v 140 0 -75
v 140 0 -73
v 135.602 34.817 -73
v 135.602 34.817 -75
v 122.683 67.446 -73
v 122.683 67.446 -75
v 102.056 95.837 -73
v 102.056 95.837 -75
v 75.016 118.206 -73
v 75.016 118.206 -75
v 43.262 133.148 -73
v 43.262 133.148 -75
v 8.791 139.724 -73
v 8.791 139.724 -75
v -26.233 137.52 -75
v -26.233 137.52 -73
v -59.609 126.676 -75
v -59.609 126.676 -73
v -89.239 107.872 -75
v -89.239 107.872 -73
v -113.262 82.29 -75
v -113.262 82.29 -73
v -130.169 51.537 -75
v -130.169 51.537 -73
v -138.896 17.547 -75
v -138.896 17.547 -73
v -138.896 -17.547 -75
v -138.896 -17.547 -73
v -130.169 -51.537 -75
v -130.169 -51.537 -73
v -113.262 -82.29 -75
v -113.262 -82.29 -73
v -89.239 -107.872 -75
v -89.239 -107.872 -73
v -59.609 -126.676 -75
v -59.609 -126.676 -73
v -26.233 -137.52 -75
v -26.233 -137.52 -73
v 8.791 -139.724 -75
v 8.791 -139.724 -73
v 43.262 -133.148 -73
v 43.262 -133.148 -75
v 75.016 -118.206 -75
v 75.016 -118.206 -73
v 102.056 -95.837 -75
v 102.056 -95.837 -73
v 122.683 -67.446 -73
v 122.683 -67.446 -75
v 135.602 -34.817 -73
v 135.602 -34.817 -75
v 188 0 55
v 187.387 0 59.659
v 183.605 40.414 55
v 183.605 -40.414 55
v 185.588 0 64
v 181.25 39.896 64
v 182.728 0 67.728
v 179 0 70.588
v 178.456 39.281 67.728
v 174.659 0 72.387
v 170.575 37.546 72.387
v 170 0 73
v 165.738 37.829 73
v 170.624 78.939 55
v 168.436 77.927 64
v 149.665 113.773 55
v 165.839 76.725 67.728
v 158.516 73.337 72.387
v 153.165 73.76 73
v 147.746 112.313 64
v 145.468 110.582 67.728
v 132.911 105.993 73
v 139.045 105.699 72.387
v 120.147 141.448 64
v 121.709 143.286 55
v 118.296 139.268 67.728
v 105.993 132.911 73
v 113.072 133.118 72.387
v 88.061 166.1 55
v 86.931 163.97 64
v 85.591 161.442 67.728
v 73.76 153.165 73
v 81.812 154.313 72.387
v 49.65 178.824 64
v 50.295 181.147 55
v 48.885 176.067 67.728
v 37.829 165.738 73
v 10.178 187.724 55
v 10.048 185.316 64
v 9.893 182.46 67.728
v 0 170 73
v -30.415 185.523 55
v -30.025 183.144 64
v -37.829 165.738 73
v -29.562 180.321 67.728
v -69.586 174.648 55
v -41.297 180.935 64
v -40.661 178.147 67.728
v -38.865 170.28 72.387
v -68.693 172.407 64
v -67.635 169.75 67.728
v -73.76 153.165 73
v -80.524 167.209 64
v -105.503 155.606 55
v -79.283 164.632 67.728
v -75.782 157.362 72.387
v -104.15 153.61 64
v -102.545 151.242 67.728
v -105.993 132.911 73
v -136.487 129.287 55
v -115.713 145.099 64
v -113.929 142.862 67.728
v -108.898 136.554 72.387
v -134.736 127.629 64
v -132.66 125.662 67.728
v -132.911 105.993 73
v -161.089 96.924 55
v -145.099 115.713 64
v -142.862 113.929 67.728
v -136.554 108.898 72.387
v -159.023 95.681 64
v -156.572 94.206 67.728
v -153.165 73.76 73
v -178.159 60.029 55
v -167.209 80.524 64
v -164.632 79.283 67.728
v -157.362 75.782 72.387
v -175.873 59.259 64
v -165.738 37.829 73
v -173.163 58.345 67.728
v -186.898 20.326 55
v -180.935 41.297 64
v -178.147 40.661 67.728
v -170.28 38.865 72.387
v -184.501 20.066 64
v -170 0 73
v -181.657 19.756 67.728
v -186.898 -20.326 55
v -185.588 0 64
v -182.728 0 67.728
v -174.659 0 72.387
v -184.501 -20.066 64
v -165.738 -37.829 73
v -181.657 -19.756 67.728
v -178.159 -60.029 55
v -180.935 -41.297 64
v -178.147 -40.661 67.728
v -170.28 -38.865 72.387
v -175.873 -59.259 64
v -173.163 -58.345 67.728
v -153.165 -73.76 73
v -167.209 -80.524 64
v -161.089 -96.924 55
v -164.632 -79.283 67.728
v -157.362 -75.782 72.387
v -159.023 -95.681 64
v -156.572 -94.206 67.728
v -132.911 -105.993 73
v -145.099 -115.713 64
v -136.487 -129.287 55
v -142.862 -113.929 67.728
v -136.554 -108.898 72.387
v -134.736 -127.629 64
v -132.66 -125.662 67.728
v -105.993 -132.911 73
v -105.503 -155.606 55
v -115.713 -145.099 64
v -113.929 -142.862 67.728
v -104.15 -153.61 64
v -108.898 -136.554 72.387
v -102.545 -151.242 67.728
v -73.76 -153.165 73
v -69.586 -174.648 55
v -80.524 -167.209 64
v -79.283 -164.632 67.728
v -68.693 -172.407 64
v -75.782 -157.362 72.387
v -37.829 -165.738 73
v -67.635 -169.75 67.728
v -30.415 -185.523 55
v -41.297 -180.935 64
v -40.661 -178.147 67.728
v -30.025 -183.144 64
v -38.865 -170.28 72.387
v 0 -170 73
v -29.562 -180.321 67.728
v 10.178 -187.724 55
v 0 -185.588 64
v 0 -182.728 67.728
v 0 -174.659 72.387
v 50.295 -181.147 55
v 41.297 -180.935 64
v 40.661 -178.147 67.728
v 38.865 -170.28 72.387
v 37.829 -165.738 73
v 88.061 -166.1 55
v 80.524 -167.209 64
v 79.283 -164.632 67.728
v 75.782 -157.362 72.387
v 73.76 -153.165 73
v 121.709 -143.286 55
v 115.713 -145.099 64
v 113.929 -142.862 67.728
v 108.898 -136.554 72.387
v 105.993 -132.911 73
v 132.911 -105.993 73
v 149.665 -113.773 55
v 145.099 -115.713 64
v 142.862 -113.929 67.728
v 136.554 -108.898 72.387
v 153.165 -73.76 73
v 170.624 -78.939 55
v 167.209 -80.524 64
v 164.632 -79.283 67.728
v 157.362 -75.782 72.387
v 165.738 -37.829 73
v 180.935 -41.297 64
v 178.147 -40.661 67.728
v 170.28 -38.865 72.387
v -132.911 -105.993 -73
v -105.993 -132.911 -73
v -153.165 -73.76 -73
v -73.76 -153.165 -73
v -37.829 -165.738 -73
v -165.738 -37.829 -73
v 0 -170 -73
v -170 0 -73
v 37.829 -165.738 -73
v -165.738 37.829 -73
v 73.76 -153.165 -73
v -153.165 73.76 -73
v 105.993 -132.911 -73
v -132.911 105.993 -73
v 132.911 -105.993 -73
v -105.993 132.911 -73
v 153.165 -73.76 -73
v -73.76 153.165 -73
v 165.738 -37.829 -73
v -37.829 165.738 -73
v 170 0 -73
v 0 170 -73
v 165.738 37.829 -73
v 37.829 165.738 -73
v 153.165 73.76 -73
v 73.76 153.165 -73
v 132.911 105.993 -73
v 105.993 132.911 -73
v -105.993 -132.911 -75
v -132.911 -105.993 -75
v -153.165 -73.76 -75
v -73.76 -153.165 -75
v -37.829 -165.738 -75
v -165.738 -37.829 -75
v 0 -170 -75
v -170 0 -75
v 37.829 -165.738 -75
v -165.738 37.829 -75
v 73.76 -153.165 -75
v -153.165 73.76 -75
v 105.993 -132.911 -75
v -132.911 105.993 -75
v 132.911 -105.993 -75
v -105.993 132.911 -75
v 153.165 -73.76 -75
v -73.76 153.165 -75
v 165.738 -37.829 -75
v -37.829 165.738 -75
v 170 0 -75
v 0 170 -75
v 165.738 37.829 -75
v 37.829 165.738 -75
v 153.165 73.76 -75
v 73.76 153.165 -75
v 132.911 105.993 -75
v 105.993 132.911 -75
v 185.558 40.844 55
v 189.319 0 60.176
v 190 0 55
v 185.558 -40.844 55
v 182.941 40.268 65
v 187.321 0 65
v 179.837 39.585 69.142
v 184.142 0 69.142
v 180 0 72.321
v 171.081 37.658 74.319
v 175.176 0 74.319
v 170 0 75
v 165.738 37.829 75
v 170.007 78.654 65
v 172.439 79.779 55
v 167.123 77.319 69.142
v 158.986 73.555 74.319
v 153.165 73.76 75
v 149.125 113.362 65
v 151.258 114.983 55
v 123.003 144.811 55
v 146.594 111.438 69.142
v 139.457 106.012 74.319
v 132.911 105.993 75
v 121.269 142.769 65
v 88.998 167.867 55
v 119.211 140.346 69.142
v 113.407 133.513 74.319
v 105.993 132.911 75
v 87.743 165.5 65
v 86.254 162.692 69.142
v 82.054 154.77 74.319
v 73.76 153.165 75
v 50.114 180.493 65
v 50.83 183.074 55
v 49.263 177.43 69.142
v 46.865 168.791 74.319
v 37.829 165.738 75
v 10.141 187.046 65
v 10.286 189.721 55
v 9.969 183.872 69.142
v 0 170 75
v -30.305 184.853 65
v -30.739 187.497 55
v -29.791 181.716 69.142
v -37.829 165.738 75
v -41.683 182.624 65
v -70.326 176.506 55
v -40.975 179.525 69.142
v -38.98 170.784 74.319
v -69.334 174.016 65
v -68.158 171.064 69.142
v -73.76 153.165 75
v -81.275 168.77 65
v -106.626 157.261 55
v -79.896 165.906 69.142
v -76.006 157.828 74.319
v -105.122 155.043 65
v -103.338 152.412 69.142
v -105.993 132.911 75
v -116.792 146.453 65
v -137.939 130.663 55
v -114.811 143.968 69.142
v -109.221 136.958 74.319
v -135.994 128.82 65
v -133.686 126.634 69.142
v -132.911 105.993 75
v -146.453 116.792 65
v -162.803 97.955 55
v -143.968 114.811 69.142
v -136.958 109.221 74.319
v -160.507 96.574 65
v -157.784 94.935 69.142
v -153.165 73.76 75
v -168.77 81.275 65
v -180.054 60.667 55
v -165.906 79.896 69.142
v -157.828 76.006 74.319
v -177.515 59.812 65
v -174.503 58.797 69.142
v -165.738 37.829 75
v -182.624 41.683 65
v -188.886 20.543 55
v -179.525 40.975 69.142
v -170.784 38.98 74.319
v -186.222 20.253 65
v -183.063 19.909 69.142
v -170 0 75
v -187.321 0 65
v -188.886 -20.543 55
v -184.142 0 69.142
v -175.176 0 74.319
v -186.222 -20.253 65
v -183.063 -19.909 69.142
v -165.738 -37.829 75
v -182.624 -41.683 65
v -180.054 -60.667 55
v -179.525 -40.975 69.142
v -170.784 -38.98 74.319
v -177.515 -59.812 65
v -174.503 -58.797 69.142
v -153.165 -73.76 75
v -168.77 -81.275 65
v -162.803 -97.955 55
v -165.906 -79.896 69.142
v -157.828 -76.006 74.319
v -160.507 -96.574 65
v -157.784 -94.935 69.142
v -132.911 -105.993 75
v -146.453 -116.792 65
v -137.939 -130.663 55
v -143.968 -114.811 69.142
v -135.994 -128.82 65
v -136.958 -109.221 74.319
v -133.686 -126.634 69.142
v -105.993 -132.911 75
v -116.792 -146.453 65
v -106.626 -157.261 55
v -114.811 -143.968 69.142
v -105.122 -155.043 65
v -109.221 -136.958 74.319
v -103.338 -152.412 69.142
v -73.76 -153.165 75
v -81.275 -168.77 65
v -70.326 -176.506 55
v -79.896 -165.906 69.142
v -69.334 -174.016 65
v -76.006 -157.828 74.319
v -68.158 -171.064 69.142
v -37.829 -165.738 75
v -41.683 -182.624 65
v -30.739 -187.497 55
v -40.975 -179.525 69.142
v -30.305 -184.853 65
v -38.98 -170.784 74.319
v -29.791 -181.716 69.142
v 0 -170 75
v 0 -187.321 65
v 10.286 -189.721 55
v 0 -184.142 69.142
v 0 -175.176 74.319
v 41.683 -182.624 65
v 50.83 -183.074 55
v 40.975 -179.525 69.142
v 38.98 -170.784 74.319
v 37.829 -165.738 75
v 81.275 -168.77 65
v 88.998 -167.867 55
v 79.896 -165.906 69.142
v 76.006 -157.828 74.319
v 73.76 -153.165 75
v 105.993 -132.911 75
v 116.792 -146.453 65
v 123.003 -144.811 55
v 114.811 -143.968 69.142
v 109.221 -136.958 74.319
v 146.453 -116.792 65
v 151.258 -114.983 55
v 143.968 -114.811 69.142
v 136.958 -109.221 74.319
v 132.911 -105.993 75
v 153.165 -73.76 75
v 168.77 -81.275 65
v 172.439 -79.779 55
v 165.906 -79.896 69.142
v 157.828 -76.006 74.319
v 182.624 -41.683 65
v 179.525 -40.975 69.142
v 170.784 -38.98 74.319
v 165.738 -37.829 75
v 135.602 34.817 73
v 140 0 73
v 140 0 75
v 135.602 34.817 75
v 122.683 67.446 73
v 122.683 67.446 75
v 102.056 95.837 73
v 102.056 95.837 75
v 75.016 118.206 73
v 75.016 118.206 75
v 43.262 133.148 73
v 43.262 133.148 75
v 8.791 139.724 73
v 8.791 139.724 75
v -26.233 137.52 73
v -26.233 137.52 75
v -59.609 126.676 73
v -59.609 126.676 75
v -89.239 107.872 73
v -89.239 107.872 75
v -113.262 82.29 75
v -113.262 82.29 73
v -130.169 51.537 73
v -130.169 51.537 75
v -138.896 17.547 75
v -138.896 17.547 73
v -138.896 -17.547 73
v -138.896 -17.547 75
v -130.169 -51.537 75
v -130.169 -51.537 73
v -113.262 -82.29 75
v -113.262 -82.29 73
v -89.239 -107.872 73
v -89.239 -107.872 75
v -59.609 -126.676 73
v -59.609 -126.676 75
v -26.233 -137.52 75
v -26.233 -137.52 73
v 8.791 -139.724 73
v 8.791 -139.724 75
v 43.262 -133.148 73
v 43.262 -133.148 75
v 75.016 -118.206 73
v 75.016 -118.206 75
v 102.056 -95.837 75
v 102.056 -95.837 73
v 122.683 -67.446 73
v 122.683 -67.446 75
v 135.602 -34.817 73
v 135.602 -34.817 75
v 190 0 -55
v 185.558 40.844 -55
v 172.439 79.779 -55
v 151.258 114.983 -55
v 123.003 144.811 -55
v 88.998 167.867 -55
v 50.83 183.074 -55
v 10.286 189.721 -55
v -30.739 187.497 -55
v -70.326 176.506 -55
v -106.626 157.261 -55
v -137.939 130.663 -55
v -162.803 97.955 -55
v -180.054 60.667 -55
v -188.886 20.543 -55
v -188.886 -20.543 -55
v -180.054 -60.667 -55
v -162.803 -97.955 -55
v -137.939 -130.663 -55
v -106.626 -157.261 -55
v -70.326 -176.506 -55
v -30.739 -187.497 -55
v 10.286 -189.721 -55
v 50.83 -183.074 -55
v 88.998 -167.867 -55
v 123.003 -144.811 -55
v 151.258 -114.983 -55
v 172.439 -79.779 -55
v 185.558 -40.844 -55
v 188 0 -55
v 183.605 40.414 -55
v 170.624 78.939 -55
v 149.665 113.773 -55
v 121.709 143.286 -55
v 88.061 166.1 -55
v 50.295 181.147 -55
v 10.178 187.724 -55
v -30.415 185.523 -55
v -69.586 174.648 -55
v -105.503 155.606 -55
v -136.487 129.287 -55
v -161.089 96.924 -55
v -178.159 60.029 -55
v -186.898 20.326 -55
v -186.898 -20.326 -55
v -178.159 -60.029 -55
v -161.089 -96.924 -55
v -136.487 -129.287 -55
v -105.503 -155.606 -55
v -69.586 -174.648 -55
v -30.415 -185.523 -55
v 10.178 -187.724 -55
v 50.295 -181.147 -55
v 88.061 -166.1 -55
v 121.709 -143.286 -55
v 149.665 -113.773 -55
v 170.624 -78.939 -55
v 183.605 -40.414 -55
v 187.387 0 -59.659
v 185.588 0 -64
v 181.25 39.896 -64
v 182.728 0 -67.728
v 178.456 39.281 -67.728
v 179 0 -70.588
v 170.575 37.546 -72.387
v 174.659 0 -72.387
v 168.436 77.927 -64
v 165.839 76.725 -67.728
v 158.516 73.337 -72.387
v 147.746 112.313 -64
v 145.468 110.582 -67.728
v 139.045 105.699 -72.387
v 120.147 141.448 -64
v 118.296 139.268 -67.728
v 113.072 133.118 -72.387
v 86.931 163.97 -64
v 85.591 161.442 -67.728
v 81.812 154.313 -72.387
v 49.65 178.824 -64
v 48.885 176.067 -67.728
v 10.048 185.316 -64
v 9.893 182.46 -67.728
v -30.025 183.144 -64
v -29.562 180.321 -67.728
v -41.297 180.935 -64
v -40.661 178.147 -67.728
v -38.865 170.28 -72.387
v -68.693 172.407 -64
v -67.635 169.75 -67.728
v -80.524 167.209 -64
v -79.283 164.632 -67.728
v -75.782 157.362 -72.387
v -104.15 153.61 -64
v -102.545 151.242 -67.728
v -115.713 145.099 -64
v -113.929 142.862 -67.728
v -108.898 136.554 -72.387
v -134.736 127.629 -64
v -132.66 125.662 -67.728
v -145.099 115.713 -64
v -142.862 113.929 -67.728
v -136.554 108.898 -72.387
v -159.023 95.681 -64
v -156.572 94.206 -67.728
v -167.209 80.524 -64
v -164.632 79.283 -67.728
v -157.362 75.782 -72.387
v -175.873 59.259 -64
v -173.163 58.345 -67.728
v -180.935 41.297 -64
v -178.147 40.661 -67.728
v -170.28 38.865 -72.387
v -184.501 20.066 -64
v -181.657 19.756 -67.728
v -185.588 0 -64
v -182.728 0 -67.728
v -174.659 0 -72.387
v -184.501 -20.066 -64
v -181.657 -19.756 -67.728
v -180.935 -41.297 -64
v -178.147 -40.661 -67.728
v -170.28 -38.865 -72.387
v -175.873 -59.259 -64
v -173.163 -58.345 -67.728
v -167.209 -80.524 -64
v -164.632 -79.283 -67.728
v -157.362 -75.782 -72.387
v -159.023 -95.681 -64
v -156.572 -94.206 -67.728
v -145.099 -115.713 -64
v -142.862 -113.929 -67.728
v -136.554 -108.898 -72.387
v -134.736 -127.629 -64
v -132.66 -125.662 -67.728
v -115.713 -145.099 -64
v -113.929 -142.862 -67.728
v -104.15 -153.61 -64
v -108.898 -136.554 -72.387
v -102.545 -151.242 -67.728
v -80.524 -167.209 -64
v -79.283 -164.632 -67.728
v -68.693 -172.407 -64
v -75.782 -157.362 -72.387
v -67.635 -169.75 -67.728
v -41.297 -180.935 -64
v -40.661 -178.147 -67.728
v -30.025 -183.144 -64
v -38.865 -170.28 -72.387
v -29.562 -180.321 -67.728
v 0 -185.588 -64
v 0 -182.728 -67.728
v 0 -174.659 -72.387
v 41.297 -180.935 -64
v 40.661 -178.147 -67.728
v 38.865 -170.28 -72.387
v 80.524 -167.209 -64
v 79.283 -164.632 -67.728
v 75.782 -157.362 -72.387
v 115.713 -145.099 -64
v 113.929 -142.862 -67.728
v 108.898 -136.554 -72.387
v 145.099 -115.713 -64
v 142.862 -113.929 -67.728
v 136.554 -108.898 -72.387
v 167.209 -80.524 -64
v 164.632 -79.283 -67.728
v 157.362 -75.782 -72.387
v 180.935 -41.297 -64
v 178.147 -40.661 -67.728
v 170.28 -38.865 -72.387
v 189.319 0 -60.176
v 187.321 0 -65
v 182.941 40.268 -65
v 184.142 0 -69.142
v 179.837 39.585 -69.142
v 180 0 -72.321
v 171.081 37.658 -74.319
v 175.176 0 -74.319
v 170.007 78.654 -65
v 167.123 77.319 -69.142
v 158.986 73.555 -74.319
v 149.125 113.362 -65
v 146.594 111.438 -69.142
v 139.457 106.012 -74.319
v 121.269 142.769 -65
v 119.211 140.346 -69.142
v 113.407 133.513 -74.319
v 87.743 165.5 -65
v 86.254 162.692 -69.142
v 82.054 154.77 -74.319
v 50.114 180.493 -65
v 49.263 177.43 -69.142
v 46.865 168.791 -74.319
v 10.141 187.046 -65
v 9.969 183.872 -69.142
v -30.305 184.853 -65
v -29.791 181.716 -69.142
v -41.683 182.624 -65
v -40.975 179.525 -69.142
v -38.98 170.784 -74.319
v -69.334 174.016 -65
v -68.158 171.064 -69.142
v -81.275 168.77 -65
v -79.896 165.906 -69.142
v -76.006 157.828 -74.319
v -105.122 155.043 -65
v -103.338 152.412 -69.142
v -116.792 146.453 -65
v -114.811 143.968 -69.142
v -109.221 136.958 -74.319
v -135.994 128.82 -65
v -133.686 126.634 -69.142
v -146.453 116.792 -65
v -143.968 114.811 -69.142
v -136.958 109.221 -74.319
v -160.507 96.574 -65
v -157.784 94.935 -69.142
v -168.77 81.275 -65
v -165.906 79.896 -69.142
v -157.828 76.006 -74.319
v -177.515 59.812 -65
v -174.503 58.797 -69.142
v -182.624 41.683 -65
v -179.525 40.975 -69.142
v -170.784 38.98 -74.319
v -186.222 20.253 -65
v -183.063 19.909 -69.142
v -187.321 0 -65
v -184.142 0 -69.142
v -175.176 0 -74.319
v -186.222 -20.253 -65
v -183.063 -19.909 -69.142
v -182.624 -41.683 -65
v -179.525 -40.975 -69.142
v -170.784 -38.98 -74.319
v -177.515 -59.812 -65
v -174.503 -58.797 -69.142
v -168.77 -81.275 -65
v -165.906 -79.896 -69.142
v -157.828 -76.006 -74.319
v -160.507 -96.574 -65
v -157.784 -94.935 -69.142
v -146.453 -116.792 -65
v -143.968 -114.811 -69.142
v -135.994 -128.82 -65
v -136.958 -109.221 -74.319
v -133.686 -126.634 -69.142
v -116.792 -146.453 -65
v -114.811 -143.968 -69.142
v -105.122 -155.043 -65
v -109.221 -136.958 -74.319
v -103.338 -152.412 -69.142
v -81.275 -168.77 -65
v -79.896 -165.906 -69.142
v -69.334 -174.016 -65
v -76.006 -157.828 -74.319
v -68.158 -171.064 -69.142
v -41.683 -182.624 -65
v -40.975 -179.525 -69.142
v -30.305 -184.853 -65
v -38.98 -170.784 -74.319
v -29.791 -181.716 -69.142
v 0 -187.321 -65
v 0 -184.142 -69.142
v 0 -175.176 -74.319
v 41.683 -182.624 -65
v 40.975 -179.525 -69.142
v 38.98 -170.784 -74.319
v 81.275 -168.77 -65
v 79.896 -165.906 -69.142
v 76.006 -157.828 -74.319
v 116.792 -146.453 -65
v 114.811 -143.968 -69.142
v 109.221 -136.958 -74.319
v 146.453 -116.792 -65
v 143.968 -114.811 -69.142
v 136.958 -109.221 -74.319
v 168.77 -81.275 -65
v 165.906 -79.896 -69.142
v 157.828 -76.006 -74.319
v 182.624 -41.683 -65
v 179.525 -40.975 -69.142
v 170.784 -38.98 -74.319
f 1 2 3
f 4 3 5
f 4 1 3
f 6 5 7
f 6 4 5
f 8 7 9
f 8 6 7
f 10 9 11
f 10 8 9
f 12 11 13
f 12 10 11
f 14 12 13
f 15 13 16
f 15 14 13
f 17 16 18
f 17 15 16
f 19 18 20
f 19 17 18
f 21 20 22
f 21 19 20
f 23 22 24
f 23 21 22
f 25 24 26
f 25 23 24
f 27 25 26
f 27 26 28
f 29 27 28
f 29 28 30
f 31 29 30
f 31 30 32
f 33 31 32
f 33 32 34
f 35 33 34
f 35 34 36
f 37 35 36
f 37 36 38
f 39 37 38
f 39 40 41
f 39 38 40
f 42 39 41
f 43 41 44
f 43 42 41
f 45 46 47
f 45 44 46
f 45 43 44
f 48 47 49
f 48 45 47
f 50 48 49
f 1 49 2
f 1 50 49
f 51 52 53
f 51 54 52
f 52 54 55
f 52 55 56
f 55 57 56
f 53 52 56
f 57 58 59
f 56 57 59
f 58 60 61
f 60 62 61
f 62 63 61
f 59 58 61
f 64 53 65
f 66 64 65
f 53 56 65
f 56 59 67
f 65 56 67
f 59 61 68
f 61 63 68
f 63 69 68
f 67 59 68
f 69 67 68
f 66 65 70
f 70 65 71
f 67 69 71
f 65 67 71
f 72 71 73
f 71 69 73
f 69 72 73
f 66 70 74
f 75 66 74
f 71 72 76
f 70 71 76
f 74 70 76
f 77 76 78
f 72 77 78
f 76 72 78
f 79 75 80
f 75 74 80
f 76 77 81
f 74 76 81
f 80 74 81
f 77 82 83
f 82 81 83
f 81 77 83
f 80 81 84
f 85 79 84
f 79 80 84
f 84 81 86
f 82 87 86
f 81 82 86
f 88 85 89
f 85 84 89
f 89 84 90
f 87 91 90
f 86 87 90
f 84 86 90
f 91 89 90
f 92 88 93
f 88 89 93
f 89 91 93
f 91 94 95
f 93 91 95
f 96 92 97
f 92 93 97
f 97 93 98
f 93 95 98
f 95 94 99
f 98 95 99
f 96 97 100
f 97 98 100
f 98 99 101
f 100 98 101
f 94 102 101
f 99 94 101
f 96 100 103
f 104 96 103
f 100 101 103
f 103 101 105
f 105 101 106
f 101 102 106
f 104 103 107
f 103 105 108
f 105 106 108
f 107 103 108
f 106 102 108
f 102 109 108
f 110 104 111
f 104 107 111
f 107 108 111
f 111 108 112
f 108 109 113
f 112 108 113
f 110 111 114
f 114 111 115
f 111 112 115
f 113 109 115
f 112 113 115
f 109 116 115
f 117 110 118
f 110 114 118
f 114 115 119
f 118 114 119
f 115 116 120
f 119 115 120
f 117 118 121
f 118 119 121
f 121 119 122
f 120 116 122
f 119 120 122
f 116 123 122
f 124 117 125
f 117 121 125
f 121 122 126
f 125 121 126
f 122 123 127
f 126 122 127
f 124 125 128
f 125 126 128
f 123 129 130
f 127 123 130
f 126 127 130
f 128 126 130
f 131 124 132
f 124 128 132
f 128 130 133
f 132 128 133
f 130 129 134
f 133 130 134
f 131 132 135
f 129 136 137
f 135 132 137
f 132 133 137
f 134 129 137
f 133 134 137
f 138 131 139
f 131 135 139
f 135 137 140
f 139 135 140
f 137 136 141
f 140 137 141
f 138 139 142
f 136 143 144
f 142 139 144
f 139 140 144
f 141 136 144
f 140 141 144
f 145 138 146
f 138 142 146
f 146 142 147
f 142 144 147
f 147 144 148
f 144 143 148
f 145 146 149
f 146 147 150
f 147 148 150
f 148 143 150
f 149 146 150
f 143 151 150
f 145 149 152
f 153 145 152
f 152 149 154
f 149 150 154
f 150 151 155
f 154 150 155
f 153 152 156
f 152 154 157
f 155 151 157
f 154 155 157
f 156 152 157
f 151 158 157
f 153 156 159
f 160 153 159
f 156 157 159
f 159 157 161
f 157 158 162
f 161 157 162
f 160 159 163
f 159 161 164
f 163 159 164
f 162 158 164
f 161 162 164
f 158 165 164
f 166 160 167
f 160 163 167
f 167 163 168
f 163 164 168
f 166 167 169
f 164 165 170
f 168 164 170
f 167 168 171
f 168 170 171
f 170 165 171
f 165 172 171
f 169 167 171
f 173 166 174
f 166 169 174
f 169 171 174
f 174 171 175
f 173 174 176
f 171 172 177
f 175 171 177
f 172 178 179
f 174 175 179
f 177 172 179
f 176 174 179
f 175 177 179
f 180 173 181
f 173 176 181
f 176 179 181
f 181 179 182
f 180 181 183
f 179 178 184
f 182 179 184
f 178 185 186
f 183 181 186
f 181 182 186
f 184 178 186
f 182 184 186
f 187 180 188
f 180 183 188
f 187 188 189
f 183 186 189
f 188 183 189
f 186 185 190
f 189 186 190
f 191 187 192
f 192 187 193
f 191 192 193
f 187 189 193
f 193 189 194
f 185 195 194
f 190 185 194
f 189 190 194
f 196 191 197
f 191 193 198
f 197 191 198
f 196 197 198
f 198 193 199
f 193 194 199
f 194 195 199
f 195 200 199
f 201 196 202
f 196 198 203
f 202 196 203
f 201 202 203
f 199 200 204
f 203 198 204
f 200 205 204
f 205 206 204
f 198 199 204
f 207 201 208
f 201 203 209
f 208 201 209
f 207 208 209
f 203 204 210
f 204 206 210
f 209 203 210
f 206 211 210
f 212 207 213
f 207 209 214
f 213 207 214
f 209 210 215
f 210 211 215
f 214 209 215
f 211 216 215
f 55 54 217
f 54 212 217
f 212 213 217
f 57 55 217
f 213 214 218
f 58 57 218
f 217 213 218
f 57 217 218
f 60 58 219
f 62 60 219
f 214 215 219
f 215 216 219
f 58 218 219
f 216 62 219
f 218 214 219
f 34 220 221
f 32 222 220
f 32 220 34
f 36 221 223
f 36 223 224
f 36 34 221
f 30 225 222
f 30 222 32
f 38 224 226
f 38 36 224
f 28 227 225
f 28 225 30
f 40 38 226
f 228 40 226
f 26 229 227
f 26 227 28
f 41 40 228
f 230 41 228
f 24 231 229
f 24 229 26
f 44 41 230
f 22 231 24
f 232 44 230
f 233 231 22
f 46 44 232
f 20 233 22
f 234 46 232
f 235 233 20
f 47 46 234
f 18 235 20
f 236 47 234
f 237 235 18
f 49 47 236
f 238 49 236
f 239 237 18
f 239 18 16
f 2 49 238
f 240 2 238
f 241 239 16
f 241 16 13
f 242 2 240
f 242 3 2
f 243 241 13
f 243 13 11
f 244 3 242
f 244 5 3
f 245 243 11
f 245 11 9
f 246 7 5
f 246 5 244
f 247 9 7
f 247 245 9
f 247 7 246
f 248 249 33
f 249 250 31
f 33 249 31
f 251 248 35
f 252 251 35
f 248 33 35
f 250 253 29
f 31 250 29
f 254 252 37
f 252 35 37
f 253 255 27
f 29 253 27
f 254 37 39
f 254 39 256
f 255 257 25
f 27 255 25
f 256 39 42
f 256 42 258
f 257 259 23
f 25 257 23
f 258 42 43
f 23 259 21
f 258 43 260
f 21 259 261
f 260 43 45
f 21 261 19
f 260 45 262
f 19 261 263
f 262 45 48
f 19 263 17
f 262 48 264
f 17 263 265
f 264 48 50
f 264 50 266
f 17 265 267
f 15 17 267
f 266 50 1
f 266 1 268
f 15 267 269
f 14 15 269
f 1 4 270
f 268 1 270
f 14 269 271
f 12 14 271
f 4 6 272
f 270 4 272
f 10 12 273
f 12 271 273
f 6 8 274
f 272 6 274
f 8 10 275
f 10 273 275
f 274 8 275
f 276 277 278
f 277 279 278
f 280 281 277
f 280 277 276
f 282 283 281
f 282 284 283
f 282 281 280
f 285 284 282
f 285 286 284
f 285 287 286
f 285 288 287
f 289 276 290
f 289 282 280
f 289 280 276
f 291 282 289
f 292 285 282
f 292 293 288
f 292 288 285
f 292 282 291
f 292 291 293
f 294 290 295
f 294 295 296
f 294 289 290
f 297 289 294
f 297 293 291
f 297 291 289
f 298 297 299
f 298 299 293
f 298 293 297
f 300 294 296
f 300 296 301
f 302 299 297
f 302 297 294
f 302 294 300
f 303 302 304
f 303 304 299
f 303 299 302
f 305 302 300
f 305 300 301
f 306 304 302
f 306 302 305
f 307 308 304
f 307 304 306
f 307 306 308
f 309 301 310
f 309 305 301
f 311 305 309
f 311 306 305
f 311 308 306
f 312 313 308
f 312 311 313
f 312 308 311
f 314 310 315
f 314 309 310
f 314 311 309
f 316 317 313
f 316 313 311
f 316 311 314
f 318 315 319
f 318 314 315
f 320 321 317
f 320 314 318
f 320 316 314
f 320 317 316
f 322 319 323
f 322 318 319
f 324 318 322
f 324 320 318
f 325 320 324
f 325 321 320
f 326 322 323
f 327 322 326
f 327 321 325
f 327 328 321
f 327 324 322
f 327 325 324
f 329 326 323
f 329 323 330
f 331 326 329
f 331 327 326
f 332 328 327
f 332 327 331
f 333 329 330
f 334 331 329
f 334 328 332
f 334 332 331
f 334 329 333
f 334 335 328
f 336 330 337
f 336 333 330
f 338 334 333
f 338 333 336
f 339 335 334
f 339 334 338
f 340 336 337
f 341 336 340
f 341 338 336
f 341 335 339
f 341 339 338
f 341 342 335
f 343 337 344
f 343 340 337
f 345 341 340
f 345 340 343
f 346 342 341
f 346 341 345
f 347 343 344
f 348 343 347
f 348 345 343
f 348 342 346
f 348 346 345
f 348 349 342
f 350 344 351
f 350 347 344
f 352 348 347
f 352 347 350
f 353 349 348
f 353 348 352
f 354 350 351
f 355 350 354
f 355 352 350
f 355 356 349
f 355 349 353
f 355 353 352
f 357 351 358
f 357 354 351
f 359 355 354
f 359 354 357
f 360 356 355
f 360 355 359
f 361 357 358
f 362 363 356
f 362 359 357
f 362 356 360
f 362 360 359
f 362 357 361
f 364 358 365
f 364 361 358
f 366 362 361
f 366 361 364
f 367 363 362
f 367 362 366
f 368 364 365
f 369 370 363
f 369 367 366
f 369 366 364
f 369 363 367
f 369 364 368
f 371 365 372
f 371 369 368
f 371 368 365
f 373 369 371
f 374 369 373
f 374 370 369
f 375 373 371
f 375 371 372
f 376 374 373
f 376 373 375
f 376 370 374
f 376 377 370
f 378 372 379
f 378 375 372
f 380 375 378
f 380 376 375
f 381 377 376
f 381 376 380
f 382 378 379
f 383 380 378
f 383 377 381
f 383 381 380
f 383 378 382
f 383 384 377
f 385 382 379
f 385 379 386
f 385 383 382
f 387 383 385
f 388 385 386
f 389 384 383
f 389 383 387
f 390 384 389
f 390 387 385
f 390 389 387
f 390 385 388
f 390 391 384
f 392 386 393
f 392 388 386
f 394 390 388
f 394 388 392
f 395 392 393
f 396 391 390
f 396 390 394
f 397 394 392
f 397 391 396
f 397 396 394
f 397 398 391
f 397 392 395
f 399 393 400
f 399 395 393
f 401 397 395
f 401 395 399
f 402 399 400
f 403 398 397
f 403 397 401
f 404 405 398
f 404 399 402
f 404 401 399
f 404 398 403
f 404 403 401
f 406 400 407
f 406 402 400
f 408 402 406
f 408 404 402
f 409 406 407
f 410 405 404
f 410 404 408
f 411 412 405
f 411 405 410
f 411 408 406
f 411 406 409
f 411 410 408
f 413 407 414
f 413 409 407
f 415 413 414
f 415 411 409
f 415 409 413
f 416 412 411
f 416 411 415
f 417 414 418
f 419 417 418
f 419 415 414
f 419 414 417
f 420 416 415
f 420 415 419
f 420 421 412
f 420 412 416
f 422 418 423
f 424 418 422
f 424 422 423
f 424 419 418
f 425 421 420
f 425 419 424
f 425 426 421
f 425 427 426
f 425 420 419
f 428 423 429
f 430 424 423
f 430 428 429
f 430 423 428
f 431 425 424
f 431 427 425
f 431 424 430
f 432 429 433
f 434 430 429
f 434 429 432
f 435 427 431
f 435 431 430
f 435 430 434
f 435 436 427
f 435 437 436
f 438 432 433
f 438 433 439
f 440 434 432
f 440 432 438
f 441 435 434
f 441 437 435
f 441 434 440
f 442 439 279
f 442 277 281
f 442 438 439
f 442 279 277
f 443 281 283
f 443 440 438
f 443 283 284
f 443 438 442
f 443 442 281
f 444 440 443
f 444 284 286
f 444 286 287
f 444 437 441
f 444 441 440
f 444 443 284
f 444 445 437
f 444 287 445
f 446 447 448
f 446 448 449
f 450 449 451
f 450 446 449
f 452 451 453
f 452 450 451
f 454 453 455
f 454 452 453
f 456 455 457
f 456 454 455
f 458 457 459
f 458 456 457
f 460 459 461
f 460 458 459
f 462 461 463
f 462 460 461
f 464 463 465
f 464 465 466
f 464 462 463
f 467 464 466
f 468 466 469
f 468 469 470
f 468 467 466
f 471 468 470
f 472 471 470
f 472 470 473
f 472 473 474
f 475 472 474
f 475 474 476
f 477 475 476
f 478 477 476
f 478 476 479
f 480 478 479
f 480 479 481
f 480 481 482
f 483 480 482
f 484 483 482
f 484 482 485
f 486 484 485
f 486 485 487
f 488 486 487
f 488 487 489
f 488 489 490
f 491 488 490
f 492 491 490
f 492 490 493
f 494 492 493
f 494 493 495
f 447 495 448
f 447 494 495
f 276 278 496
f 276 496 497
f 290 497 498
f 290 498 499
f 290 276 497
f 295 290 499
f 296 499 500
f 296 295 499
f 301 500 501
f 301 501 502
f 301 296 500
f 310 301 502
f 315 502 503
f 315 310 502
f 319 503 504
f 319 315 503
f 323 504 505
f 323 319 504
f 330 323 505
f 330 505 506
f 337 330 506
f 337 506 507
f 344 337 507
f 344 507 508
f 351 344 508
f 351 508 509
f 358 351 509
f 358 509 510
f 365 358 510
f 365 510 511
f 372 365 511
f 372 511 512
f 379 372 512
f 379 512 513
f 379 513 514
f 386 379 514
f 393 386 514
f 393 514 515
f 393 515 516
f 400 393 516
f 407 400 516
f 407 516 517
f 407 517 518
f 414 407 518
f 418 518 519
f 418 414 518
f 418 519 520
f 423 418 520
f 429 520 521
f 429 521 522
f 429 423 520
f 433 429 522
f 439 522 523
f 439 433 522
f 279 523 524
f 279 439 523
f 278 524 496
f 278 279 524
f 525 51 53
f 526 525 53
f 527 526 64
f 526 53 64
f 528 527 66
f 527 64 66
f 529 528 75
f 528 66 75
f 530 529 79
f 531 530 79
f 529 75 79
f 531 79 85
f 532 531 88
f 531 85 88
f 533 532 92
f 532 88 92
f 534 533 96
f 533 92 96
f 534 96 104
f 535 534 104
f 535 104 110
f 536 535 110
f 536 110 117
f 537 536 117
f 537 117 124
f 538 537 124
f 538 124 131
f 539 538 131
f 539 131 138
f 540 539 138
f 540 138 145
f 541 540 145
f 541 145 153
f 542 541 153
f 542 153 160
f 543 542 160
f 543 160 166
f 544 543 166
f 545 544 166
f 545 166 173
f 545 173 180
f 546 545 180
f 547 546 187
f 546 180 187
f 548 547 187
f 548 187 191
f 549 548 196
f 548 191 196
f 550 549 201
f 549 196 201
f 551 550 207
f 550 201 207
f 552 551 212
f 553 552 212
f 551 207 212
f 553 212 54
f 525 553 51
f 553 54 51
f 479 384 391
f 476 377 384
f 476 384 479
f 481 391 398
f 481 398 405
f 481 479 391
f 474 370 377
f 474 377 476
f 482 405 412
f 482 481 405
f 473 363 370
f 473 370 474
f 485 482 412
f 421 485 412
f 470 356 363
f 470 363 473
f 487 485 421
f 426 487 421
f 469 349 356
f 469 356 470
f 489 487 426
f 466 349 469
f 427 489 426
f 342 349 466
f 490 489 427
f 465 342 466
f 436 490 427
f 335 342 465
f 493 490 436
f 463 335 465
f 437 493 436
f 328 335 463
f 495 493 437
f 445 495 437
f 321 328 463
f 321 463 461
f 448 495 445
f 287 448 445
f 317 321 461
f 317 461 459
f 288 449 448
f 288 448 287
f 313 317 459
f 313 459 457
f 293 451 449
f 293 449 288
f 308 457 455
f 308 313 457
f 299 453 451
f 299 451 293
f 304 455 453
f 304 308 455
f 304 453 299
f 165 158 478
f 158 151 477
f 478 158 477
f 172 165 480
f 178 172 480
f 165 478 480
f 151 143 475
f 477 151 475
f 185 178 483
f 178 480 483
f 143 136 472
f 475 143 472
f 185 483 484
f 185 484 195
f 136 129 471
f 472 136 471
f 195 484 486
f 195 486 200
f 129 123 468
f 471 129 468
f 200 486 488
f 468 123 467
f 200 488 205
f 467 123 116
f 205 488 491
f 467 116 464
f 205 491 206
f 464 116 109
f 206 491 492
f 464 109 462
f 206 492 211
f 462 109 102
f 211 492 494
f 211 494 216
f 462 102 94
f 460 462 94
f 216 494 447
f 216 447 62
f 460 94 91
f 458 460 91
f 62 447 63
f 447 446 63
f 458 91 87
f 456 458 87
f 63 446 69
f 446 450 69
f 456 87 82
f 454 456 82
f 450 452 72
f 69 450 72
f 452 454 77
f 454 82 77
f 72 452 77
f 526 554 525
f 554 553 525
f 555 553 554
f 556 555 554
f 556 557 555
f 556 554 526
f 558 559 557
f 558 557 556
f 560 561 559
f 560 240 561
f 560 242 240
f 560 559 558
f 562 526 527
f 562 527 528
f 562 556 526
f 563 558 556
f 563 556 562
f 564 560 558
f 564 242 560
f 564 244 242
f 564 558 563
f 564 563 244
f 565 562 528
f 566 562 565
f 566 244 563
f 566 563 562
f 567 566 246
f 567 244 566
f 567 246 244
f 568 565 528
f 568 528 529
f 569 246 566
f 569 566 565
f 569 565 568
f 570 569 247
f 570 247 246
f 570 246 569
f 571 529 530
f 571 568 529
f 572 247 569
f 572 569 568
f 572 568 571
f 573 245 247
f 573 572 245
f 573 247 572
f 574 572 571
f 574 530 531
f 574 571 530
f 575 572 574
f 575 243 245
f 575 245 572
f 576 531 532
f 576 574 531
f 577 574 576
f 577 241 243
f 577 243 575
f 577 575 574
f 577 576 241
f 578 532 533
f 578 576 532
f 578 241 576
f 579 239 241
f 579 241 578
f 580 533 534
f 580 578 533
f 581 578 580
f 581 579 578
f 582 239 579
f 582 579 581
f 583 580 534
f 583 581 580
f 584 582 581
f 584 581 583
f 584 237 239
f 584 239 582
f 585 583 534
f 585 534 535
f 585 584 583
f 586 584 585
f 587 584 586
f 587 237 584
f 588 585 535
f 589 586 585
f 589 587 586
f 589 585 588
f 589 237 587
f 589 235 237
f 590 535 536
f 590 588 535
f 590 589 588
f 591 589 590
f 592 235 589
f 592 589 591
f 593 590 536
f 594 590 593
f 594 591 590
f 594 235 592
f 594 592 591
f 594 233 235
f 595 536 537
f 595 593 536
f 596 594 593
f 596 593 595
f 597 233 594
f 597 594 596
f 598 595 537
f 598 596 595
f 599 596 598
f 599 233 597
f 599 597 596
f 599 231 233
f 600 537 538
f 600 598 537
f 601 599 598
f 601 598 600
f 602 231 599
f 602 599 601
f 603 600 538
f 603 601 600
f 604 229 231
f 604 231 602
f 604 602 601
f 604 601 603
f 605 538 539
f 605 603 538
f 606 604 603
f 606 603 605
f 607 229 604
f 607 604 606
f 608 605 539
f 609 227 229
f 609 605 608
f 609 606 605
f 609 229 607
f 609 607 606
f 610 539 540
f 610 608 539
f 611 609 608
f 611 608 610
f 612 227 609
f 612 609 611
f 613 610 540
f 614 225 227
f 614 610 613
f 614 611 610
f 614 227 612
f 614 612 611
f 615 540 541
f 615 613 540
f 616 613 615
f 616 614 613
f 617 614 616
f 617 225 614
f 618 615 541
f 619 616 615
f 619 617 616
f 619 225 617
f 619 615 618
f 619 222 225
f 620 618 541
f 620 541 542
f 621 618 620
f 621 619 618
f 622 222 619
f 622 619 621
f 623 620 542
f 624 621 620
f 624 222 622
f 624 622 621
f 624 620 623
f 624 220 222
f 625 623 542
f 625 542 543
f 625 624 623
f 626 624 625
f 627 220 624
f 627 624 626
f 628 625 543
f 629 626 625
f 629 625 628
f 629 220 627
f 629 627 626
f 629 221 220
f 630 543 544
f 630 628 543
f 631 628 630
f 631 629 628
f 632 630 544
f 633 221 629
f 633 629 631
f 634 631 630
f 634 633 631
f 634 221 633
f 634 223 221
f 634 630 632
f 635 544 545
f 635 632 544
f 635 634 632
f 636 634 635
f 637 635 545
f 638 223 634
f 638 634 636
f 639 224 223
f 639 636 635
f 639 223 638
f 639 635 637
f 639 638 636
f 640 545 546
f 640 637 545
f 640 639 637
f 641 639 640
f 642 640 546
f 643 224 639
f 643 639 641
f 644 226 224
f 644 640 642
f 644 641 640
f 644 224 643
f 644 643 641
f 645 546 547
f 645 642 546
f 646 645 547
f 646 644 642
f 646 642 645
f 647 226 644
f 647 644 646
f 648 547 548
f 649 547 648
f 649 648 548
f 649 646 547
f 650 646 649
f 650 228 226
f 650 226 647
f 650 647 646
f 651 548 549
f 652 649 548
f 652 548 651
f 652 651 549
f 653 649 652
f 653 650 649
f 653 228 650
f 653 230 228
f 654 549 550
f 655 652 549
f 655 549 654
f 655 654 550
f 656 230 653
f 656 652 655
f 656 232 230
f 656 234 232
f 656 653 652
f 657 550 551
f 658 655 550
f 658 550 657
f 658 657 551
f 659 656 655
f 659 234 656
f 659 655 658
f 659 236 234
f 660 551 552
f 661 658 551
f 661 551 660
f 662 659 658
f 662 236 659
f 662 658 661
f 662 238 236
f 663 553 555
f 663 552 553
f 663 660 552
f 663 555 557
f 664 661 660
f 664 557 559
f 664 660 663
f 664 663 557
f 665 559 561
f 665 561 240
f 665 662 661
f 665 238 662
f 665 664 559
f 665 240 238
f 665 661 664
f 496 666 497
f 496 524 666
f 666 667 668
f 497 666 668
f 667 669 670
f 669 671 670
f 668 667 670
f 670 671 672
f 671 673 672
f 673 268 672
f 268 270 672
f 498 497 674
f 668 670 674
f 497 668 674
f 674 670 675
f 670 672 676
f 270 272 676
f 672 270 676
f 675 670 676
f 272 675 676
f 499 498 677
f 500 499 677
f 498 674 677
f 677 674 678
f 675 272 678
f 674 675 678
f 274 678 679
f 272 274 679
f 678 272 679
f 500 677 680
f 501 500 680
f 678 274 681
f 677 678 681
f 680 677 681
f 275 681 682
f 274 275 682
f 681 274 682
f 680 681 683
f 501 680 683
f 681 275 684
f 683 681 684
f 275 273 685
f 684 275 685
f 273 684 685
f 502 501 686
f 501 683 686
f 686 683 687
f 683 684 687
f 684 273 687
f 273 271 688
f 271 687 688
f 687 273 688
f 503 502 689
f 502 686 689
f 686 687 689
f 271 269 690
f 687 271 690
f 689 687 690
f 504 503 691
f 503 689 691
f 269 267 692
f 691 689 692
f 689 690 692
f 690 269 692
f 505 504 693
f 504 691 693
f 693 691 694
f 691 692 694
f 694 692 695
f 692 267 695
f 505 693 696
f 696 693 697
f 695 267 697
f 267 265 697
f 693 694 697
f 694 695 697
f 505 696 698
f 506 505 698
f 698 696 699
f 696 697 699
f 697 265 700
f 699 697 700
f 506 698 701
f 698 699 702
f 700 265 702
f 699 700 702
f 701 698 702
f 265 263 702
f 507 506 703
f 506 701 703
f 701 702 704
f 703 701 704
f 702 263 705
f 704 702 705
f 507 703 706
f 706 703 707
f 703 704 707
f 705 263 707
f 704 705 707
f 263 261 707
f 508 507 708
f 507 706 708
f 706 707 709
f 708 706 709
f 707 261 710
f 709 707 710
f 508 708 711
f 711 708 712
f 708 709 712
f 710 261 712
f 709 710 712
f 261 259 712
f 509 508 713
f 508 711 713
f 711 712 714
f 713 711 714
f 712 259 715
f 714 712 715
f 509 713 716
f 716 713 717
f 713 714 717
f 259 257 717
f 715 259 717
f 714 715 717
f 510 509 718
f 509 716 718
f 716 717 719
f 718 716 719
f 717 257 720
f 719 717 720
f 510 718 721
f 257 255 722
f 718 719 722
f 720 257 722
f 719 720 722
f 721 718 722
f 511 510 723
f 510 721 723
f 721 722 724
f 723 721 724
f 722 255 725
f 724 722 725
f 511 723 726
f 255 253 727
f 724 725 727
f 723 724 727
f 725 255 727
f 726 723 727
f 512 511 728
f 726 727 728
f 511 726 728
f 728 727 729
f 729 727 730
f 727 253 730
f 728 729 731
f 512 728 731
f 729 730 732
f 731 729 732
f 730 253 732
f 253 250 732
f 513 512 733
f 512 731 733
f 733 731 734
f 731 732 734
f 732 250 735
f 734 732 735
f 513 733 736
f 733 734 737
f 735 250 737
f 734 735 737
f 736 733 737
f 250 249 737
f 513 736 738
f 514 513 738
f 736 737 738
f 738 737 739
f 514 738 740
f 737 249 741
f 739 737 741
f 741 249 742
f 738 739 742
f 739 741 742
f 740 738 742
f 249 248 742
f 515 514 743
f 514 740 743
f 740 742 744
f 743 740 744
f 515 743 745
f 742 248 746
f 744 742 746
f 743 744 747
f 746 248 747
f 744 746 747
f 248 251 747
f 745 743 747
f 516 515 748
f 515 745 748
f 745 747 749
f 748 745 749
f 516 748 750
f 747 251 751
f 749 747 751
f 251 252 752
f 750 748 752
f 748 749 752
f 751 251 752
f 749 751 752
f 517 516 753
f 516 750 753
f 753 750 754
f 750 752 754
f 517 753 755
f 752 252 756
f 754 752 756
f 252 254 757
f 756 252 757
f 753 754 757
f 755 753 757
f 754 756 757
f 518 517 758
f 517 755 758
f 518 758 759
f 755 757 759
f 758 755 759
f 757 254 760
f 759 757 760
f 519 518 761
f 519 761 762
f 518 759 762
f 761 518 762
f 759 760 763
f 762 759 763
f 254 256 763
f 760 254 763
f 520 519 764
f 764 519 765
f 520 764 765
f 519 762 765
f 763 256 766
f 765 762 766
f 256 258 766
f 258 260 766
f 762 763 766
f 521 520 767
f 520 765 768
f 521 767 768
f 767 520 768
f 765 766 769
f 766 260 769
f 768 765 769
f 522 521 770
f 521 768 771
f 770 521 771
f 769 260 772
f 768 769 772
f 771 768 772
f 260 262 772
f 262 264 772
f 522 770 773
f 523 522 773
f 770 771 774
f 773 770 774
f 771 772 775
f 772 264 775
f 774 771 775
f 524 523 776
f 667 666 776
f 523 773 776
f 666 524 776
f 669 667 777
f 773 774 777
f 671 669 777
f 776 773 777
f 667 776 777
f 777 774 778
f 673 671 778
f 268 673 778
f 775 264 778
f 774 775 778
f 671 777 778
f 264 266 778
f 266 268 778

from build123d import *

# Parameters (mm, degrees)
SKETCH1_R           = 190
SKETCH1_R_2         = 140
BOSS_EXTRUDE1_DEPTH = 75
FILLET2_R           = 20
SHELL1_T            = -2


with BuildPart() as part:
    # Sketch1 → Boss-Extrude1 (new, symmetric)
    with BuildSketch(Plane.XY):
        Circle(SKETCH1_R)
        Circle(SKETCH1_R_2, mode=Mode.SUBTRACT)
    extrude(amount=BOSS_EXTRUDE1_DEPTH, both=True)

    # Fillet2
    fillet2_edges = [part.edges().sort_by_distance(p)[0] for p in [
        (-190, 0, -75),
        (-190, 0, 75),
    ]]
    fillet(fillet2_edges, radius=FILLET2_R)

    # Shell1
    shell1_openings = [part.faces().sort_by_distance(p)[0] for p in [
        (-140, 0, 0),
    ]]
    offset(amount=SHELL1_T, openings=shell1_openings, kind=Kind.INTERSECTION)


solid = part.part
